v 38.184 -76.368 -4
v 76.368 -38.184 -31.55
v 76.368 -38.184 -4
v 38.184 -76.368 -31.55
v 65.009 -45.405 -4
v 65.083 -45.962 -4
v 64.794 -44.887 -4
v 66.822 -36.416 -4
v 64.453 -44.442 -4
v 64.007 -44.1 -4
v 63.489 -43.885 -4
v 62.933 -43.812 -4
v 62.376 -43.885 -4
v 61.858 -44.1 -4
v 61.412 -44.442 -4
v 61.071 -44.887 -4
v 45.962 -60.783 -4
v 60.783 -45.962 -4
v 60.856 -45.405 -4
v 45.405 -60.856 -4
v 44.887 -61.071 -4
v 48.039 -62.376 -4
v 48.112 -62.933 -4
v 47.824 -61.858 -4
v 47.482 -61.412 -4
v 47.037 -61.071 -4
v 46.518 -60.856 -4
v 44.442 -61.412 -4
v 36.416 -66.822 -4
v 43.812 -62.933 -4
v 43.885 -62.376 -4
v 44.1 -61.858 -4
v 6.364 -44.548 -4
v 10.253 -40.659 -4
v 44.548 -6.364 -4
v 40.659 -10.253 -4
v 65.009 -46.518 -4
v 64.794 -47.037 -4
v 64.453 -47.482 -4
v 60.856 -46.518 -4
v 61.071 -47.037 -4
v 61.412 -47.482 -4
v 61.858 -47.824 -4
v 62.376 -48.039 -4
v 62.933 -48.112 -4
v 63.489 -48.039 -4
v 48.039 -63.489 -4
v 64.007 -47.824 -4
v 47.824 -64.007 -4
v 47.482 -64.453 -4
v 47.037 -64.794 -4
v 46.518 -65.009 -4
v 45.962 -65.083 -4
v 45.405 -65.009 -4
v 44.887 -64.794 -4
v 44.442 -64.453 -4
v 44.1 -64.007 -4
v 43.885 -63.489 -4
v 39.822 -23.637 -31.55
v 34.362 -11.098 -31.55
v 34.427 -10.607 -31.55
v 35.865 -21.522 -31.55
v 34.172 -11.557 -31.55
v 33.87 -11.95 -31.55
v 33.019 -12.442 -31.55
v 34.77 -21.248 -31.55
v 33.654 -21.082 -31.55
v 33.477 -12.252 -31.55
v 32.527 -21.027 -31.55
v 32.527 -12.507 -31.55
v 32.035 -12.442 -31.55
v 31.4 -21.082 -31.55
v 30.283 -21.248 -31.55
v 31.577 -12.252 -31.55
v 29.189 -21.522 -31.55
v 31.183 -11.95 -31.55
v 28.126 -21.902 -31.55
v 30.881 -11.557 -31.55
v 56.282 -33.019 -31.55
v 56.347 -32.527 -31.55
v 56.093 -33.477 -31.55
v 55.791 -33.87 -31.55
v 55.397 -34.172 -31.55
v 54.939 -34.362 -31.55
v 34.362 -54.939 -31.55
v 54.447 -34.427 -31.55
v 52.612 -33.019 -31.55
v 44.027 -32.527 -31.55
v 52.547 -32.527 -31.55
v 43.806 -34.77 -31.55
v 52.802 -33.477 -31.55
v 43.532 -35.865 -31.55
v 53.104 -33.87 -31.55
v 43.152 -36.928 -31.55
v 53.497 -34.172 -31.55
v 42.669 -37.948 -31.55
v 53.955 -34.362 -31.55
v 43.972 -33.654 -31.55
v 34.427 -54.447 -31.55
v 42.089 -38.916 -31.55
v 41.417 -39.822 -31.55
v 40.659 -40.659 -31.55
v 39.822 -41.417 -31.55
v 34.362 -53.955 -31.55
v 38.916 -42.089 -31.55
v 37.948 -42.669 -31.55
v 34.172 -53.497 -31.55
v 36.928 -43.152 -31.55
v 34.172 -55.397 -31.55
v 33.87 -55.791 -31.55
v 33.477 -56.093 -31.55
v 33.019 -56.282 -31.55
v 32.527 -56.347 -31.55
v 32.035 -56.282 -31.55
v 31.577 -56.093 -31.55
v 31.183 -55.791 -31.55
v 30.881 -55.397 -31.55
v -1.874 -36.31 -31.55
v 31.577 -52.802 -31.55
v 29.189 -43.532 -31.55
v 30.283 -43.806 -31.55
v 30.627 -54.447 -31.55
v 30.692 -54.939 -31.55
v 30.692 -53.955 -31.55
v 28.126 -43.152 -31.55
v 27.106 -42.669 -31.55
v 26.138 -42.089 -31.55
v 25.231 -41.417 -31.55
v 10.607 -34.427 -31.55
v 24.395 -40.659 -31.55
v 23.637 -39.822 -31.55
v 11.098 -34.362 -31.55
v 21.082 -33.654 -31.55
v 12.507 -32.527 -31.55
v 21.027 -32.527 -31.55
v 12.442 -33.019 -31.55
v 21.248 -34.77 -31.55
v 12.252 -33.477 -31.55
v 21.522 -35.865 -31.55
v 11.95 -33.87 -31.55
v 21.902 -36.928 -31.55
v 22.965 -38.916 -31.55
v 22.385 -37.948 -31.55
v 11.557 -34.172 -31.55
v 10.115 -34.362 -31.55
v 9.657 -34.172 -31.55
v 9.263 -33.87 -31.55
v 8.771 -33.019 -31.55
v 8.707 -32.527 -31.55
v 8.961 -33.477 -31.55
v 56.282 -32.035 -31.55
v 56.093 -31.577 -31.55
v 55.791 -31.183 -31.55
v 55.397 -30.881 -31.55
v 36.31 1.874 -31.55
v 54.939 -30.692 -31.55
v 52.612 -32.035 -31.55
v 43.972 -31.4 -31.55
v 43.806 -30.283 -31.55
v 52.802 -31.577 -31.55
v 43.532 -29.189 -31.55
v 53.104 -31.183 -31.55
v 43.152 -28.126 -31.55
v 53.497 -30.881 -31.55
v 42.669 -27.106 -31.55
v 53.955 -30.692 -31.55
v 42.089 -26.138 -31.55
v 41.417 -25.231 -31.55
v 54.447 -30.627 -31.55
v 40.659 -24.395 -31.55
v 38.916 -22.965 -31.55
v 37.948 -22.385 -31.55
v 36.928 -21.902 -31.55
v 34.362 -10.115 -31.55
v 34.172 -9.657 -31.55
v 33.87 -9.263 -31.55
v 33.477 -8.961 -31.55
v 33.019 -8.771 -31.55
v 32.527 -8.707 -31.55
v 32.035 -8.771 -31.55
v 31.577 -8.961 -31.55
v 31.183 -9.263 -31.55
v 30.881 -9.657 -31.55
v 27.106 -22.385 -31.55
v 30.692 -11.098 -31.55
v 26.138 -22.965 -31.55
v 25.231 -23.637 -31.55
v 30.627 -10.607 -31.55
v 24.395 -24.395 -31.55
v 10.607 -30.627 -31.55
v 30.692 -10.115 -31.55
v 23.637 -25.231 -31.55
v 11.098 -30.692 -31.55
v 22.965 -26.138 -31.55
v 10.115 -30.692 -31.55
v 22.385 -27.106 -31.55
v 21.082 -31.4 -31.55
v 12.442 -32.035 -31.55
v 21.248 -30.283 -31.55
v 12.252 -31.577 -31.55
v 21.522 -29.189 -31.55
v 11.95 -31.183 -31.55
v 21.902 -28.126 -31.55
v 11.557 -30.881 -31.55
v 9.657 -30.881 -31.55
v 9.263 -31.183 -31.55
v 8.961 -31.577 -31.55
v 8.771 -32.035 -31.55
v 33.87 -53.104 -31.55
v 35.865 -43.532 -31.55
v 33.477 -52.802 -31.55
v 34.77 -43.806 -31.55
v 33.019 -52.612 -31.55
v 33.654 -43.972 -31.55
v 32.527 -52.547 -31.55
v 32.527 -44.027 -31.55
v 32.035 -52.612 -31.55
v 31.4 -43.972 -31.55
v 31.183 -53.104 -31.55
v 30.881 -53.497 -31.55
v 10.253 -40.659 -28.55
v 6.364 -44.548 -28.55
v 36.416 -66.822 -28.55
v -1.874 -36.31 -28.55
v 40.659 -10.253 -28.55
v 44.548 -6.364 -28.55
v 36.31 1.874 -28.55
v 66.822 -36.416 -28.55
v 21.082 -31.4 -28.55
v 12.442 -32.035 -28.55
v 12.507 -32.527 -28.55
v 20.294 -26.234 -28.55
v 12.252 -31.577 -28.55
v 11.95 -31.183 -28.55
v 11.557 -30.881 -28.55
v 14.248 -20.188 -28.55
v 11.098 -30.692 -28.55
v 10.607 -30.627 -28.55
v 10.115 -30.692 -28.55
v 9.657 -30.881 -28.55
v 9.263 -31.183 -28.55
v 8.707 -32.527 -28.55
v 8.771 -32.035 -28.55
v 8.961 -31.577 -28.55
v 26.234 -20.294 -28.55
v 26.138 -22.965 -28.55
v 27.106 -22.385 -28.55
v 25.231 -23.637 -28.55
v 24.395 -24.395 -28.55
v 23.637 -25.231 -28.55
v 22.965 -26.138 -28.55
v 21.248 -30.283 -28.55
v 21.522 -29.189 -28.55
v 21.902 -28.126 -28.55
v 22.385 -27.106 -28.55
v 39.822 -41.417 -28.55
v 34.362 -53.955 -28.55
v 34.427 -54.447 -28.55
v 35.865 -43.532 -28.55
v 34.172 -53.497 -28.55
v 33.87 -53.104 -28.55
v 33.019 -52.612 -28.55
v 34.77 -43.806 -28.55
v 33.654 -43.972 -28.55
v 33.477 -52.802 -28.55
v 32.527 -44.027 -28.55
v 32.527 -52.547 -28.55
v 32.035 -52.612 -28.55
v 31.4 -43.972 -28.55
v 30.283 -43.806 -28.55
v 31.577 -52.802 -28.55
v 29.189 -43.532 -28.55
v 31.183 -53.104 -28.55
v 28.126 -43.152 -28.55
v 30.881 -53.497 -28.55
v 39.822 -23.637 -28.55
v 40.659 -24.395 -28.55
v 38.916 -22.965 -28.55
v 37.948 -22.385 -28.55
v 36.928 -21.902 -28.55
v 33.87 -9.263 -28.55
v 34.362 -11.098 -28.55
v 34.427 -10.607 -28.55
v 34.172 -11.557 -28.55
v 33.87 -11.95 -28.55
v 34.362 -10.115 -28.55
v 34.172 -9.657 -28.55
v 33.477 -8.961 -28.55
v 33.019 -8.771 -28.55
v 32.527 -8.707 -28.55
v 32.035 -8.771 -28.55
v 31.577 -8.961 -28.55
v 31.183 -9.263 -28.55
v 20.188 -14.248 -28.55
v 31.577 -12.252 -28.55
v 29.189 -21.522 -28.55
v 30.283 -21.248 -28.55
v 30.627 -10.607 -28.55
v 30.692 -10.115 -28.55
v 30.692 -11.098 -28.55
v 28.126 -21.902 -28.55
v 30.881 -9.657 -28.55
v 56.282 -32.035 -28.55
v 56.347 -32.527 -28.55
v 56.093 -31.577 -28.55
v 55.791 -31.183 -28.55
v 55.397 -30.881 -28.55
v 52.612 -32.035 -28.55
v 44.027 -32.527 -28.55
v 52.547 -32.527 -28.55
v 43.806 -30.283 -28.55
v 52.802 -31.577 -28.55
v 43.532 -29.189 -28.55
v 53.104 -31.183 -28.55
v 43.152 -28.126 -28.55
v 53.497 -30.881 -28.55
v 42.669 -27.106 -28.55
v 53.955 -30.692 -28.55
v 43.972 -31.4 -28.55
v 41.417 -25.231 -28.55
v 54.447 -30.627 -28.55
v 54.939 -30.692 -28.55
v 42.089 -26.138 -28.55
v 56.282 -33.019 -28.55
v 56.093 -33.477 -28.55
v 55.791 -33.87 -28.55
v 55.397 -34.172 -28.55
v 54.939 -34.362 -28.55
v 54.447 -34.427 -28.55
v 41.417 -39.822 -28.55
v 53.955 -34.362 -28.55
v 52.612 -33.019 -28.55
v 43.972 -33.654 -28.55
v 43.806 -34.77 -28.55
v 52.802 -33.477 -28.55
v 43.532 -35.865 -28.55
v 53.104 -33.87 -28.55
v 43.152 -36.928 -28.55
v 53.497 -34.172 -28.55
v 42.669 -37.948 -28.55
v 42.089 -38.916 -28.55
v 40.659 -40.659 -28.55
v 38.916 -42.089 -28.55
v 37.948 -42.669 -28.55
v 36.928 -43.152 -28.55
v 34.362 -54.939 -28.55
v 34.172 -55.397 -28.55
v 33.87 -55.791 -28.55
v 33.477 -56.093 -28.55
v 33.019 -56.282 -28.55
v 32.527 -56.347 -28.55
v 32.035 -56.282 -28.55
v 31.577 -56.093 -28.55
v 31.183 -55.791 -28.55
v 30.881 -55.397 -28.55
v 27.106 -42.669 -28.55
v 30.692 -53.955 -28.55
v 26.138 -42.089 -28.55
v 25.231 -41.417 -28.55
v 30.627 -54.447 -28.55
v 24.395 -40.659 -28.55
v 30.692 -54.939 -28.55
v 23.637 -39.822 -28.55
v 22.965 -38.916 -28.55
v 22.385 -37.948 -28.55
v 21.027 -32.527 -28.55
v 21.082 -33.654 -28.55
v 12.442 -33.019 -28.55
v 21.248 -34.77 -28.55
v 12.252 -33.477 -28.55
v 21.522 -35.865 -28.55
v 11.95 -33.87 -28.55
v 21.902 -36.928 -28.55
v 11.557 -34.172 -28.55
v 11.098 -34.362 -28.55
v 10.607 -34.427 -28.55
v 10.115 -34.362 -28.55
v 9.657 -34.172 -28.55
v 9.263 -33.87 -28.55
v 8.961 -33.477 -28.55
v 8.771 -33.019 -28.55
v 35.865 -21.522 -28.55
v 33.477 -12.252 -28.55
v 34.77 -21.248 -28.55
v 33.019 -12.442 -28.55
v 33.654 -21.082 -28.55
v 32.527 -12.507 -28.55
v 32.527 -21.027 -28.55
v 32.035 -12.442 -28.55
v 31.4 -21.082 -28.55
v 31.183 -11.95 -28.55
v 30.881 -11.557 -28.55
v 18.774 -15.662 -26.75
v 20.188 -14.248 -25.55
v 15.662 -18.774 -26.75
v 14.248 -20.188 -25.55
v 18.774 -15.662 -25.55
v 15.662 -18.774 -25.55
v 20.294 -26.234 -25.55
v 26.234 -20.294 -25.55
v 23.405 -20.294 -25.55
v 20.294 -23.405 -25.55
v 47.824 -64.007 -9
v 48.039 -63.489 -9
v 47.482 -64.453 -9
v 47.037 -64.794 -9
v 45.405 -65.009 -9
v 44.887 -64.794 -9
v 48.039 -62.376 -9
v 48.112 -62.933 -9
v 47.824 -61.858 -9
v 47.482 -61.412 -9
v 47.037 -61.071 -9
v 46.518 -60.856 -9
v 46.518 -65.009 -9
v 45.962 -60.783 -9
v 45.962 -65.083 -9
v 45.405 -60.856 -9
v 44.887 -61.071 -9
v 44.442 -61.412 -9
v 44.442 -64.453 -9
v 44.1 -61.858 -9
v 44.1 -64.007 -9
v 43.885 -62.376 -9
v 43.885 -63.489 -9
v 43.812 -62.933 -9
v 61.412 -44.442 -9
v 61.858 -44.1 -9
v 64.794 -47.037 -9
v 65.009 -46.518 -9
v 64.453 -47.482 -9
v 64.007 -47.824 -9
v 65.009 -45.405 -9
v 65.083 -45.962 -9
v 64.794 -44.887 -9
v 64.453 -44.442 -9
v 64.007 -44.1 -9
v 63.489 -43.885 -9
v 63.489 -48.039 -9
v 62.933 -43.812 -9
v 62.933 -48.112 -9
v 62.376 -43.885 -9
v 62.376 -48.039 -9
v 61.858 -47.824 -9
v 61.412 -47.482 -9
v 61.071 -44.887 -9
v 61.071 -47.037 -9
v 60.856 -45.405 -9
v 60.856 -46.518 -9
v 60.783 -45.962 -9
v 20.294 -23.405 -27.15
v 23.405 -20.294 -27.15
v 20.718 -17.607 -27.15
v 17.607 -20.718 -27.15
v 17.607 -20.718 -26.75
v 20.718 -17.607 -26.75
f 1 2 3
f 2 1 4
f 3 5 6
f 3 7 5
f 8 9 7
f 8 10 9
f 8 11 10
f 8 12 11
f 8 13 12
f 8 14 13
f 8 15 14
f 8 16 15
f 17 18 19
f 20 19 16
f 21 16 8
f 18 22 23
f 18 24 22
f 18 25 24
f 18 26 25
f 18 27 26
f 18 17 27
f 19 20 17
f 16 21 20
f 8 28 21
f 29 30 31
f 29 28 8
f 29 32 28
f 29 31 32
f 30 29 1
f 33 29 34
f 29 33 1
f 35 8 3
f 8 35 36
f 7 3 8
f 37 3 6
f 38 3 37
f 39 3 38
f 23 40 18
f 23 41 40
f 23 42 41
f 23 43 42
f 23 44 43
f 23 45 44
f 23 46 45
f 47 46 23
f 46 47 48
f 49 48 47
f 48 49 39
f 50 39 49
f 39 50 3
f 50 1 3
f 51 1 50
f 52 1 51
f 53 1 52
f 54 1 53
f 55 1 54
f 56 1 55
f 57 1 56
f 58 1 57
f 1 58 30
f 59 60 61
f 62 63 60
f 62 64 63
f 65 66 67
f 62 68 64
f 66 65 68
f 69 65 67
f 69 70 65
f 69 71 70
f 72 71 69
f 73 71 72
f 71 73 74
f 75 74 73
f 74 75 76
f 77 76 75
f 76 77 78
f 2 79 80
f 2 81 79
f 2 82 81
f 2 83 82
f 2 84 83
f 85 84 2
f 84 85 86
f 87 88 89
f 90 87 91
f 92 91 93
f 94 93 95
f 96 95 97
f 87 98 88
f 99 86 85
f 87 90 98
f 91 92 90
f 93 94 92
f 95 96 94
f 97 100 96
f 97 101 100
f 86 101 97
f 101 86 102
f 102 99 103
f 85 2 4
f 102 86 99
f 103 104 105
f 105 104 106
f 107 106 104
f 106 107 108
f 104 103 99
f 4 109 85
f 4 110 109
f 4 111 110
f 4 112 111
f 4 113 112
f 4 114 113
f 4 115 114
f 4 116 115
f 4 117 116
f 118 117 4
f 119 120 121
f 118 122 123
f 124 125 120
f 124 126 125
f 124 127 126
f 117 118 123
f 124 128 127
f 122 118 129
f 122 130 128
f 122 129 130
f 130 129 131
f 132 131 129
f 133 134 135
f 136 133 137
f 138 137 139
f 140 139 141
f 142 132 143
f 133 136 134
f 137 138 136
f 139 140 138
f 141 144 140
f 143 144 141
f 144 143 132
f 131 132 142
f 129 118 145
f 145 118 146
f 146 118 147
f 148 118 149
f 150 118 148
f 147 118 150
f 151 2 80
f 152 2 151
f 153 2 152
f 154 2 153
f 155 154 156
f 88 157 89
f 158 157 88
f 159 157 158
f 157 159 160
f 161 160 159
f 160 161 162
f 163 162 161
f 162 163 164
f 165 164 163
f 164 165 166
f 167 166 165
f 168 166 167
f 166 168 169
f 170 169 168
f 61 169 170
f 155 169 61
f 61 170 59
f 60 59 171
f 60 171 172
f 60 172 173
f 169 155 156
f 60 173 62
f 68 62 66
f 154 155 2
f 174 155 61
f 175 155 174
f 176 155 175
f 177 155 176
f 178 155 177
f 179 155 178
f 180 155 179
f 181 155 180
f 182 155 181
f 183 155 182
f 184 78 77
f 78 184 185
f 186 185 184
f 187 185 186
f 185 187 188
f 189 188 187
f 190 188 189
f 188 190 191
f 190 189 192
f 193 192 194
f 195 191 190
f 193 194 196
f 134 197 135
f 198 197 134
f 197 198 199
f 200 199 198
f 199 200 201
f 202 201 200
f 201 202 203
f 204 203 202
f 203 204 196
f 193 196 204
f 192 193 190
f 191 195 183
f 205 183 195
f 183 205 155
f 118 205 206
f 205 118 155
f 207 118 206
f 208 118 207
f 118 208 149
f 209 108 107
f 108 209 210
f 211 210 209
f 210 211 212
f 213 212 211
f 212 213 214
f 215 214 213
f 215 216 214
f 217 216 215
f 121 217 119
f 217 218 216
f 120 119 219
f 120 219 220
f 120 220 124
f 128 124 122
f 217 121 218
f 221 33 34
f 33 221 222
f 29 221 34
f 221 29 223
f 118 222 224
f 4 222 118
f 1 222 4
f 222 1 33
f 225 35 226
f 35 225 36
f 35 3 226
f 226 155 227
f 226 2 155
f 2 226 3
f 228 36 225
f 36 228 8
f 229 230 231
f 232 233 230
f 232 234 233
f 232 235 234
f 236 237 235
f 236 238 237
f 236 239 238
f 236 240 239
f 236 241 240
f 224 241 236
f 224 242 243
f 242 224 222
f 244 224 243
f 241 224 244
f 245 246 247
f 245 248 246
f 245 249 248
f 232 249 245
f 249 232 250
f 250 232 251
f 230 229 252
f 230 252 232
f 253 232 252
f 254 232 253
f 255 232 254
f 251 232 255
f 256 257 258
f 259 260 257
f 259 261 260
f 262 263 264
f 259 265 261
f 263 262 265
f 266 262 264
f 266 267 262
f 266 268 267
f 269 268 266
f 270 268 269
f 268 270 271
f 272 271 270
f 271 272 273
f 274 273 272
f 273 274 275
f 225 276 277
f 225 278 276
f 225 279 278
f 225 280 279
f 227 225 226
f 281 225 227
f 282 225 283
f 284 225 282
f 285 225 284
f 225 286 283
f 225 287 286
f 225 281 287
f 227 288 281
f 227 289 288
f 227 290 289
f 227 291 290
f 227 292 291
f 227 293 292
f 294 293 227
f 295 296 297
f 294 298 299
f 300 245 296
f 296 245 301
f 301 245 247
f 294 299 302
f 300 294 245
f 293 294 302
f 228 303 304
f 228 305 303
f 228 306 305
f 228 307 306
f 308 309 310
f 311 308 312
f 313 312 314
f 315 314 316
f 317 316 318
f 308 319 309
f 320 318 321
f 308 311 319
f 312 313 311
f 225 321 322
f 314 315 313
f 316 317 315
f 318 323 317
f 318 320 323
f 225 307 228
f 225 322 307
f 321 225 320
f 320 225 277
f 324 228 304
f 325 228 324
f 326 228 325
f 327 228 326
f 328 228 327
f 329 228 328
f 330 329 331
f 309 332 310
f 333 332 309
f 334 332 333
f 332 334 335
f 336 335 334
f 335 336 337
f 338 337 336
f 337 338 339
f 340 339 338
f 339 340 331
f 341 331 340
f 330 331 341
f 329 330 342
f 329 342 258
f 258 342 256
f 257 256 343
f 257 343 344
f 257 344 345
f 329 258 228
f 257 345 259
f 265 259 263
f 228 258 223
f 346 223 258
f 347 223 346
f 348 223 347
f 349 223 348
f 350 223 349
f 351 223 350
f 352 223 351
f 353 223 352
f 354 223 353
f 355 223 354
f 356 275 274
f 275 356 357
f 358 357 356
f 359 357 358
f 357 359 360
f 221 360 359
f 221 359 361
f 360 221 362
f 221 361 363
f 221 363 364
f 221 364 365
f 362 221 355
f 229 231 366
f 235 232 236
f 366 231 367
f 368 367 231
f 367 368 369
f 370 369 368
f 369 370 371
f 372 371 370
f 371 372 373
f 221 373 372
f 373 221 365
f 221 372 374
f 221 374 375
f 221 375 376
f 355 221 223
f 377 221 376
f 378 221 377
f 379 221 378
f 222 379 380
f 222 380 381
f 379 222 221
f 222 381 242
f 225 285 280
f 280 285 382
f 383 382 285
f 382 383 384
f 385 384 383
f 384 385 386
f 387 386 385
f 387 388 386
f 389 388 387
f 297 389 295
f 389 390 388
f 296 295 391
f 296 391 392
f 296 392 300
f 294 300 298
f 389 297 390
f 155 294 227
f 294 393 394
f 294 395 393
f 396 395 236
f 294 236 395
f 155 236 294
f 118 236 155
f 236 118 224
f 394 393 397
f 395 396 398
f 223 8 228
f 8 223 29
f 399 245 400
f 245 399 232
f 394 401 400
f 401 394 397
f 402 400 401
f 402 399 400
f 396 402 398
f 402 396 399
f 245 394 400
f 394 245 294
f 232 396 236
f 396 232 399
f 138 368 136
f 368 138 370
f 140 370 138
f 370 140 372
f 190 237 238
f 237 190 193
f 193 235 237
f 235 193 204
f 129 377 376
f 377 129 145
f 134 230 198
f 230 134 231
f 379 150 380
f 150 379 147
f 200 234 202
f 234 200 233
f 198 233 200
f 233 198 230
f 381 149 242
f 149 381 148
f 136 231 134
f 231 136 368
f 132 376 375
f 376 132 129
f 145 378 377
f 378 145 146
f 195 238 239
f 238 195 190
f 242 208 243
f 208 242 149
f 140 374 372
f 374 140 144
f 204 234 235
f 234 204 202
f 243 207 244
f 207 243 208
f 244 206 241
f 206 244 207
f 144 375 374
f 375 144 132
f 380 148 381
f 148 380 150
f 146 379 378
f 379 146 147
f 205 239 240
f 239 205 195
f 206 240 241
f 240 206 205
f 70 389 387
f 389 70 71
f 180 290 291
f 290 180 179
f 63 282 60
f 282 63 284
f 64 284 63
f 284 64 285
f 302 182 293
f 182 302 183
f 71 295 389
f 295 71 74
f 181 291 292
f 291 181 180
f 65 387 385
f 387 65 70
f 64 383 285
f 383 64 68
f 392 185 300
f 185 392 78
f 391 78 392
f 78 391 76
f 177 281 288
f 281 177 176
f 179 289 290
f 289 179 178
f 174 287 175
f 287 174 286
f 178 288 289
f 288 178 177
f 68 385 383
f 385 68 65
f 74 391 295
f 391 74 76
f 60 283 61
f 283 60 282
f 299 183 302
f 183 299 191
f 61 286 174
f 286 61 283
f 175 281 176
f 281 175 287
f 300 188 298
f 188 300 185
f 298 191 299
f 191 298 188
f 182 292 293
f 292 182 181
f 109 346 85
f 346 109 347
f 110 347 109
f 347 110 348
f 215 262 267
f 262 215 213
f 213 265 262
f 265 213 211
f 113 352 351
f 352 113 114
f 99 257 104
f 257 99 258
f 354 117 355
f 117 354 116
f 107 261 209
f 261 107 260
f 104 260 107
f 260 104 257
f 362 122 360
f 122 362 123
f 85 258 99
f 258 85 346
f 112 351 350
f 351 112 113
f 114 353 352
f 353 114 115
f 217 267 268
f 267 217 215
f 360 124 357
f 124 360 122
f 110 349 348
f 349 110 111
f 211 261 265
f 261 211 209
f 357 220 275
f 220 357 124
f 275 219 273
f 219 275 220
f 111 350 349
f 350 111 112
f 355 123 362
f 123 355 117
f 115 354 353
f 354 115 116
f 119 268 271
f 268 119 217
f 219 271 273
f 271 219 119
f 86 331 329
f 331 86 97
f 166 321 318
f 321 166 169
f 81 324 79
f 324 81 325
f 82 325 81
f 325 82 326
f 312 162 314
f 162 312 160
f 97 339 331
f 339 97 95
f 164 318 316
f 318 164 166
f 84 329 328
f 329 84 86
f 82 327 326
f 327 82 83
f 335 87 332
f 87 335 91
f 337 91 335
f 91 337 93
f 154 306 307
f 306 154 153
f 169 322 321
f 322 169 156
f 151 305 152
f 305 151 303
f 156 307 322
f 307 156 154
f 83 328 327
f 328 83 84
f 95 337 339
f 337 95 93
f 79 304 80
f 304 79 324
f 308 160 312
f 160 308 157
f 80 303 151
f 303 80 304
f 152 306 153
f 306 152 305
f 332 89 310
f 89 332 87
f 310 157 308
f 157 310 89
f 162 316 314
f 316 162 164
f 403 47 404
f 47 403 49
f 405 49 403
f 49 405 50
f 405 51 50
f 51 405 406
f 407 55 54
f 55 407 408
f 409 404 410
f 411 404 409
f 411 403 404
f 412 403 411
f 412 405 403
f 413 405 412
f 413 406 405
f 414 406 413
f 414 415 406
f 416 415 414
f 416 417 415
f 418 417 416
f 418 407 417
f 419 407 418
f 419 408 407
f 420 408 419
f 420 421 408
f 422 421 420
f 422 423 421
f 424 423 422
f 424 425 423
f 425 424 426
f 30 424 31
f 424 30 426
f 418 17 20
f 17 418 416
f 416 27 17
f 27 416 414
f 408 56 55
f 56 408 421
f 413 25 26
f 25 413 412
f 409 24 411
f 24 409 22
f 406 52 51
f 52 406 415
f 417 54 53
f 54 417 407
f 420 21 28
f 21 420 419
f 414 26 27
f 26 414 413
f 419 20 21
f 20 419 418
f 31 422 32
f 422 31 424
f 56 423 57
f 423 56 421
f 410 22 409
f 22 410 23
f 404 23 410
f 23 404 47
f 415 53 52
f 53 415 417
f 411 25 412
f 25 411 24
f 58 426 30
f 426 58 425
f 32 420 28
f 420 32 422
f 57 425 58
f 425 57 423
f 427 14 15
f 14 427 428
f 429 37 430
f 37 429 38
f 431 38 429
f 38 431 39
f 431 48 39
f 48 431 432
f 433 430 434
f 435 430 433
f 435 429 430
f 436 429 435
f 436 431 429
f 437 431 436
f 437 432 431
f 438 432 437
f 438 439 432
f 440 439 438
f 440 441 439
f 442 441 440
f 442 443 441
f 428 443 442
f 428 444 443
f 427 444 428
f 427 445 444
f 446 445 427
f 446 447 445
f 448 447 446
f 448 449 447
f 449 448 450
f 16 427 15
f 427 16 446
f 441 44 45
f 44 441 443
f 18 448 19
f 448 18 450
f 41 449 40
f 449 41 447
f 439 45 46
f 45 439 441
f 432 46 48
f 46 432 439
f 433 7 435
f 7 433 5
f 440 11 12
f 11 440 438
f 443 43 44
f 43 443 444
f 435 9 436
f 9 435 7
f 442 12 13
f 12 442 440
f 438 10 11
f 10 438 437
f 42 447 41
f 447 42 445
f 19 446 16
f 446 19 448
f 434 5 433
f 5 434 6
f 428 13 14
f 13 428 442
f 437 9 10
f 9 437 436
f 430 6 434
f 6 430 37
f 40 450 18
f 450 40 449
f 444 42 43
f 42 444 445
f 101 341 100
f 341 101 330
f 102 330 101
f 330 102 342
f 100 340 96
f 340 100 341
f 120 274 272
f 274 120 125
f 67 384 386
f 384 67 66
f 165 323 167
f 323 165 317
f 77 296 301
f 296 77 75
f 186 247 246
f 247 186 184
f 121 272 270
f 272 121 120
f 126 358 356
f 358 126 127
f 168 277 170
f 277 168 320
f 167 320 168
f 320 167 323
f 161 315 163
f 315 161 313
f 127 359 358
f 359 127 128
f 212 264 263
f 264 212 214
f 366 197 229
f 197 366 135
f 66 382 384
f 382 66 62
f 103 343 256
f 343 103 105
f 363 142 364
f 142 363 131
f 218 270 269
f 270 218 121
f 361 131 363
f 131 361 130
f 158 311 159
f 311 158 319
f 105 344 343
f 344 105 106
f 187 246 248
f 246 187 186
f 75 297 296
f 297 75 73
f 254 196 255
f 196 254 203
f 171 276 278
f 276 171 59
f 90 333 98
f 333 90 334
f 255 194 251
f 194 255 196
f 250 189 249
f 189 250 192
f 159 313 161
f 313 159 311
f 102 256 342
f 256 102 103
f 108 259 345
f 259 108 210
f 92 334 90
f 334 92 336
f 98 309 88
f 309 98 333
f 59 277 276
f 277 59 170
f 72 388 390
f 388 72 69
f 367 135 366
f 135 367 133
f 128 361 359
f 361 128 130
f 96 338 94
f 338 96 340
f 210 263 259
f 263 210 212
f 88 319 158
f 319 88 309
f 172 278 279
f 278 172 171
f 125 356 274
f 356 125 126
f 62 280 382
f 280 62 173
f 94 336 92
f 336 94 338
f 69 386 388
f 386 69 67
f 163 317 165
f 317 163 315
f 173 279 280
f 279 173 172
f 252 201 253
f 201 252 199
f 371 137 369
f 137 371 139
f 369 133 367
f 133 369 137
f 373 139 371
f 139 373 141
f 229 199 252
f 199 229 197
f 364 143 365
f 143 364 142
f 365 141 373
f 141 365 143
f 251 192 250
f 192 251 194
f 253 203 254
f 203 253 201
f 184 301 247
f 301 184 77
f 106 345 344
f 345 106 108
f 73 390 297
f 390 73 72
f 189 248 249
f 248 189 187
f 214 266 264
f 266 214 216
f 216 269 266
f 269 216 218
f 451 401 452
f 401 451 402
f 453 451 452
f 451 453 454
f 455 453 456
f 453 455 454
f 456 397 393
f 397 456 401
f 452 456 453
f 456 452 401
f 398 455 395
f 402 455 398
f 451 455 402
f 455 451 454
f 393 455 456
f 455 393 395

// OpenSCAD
// file: ../../level2.scad
// Level 2 - shared dimensions for the drive deck, motor bracket, body and skirt.
// Frame: origin at the centre of the deck's TOP surface; +Z up, +Y = front (display), +X = right.
// The lazy Susan sits on the deck's plinth; the turntable pulley hangs through the deck's hole.
include <params.scad>

// ---- outline -------------------------------------------------------------------------------
l2_size   = [160, 160];     // footprint (rounded square), same for body and skirt
l2_r      = 14;             // corner radius
l2_h      = 90;             // body height (floor to the deck's underside... see body)
l2_wall   = 2.5;            // body walls

// ---- the reComputer under Level 2, and the skirt round it (skirt.scad) -------------------------
jetson    = [130.1, 121.1, 51];     // reComputer J4012, MEASURED (x, y, height) with its case top OFF;
                                    //   ports at the back, fan near the middle (~1 cm toward the front)
jetson_top = 7.1;                   // the case top, if fitted: 58.1 with it, MEASURED
air_gap   = 10;                     // over the case top when it's on (17 over the open board): the fan
                                    //   draws in from here
skirt_h   = jetson[2] + jetson_top + air_gap;   // 68.1: desk -> Level 2's floor
// body <-> skirt screws (M3 down through the body floor into inserts in the skirt): along the
// sides, outside the reComputer (x +/-65)
skirt_pts = [[-71, -45], [-71, 45], [71, -45], [71, 5]];   // clear of the buck (left),
                                    //   the perfboard (right front) and the motor (right back)

// ---- deck ----------------------------------------------------------------------------------
deck_t    = 4;              // deck plate: z = -deck_t .. 0
deck_hole = 112;            // reach the inner ring's bolts from below during assembly

// ---- lazy Susan + turntable pulley (turntable_pulley.scad) --------------------------------
z_ls      = plinth_h;                    // lazy Susan's underside (on the plinth): 2
z_plate   = z_ls + ls_h;                 // turntable plate's underside = inner ring top: 12.5
belt_drop = 24.5;                        // plate underside -> belt centre (turntable_pulley)
z_belt    = z_plate - belt_drop;         // -12: belt centre, below the deck top
pulley_R  = 100 * 2 / PI / 2;            // 31.83: ring pulley pitch radius (100 T)
pulley_bottom = z_belt - 3.2 - 1.6 - 2.2;  // -19: lowest point of the hanging pulley
clamp_r   = 35.5;                        // pulley's belt clamp block (its widest part)

// ---- motor ----------------------------------------------------------------------------------
motor_a   = -45;            // direction of the motor from the centre: back-right corner
motor_C   = 46;             // nominal centre distance; the bracket slides +/- tension_travel (42..50:
                            //   at 41 the motor pulley would touch the ring pulley's flange)
tension_travel = 4;
nema      = [42.3, 33.4];   // NEMA17 (MEASURED body length; not a pancake): square, body length
nema_shaft = 17.5;          // MEASURED shaft length above the face
nema_holes = 31;            // M3 screw spacing on its face
nema_boss = 22;             // centring boss on its face (dia), ~2 tall
mp_T      = 20;             // motor pulley teeth
mp_belt_c = 13 + 7.1 / 2;   // MEASURED: pulley pushed fully down on the motor, its toothed section
                            //   (7.1 wide; the belt is a standard 6 mm) runs 13..20.1 above the face
bracket_t = 3;              // motor plate thickness; the pulley passes down through its centre hole
bracket_drop = 3;           // the motor hangs this much LOWER than "pulley pushed fully down" needs:
                            //   on the first build the ring pulley sat ~2 mm below the motor pulley,
                            //   so the motor pulley now starts ~1 mm low and is raised on the shaft
                            //   to line the belt up (a few mm of adjustment either way)
z_motor_face  = z_belt - mp_belt_c - bracket_drop;   // -31.55
z_bracket_top = z_motor_face + bracket_t;    // -28.55
z_motor_bottom = z_motor_face - nema[1];     // -64.95
z_mp_top  = z_motor_face + bracket_drop + 13 + 7.1 + 1;   // ~-7.45 (pulley raised to the belt; EST top flange ~1 mm)
// main file
// Motor bracket - hangs the NEMA17 (shaft up) under the drive deck so its 20 T pulley
// lines up with the turntable pulley's teeth. Two M3 screws from above the deck, through its
// radial slots, into heat-set inserts in the bracket's far wall: slide it outward to tension the
// belt. The motor screws to the plate from above (4 x M3) before the bracket goes in; its pulley
// then goes on, pushed fully down through the plate's centre hole onto the motor.
//
// Also carries the HOMING SENSOR: an A3144-type Hall sensor lying face-up in a pocket on the
// plate, under the turntable pulley's bottom edge. A small magnet glued under the pulley (on the
// flat ring of its bottom face, ~28 mm from the centre, on the motor side when the head looks
// straight ahead) passes ~4 mm above it at home. The sensor sits on a pad bracket_drop (3 mm) tall,
// so lowering the motor for belt adjustment didn't move it away from the magnet. Its leads run straight inward along a short
// groove to the plate's inner edge and drop down beside the motor - clear of the motor's screws
// (a groove out to the side would cross a screw hole, and the screw head would pinch the wires).
//
// Modelled in place (deck frame, see level2.scad) with the plate at the bottom.
// PRINT as modelled: plate on the bed, walls up, no supports. PETG.
include <../../level2.scad>

m3_clear  = 3.4 + cal_hole;               // prints ~3.35 (PETG): M3 slides through
plate_u   = [-nema[0] / 2 - 0.5, 35];     // plate extent along the radial line (motor frame)
half_v    = 27;                           // half-width across it
side_wall = 5.5;                          // side walls, |v| = half_v - side_wall .. half_v
side_u0   = -10;                          // side walls start here: clear of the pulley's clamp
                                          //   block even with the bracket slid 4 mm inward
far_wall  = [27, 35];                     // far wall (u range): takes the two deck screws
slot_u    = 31; slot_v = 12;              // must match drive_deck.scad
hall      = [3.4 + 0.4, 4.0 + 0.4, 1.6];  // A3144 TO-92 lying flat: [u, v, depth]
hall_u    = -17;                          // ~28 mm from the turntable's centre
hall_pad  = [hall[0] + 4, hall[1] + 4];   // raised pad under the sensor (u, v), from the plate's inner edge

module bracket() {
    z0 = z_motor_face;                    // plate underside = motor face
    z1 = -deck_t;                         // wall tops = deck underside
    difference() {
        union() {
            // motor plate
            translate([plate_u[0], -half_v, z0]) cube([plate_u[1] - plate_u[0], 2 * half_v, bracket_t]);
            // side walls
            for (s = [-1, 1]) translate([side_u0, s > 0 ? half_v - side_wall : -half_v, z0])
                cube([plate_u[1] - side_u0, side_wall, z1 - z0]);
            // far wall
            translate([far_wall[0], -half_v, z0]) cube([far_wall[1] - far_wall[0], 2 * half_v, z1 - z0]);
            // pad under the Hall sensor: keeps it at its original height under the magnet
            translate([plate_u[0], -hall_pad[1] / 2, z0]) cube([hall_u + hall_pad[0] / 2 - plate_u[0], hall_pad[1], bracket_t + bracket_drop]);
        }
        // motor centring boss and its four screws
        translate([0, 0, z0 - 1]) cylinder(d = nema_boss + 1, h = bracket_t + 2, $fn = 64);
        for (su = [-1, 1], sv = [-1, 1]) translate([su * nema_holes / 2, sv * nema_holes / 2, z0 - 1])
            cylinder(d = m3_clear, h = bracket_t + 2, $fn = 24);
        // heat-set inserts for the deck screws
        for (v = [-slot_v, slot_v]) translate([slot_u, v, z1 - insert_m3[1]]) cylinder(d = insert_m3[0], h = insert_m3[1] + 1, $fn = 24);
        // Hall sensor pocket (leads toward the inner edge) + lead groove out over that edge
        translate([hall_u - hall[0] / 2, -hall[1] / 2, z0 + bracket_t + bracket_drop - hall[2]]) cube([hall[0], hall[1], hall[2] + 1]);
        translate([plate_u[0] - 1, -hall[1] / 2, z0 + bracket_t + bracket_drop - 1.2]) cube([hall_u - plate_u[0] + 1, hall[1], 2]);
    }
}

rotate(motor_a) translate([motor_C, 0, 0]) bracket();

// ghosts (not printed): motor and its pulley
%rotate(motor_a) translate([motor_C, 0, 0]) {
    translate([-nema[0] / 2, -nema[0] / 2, z_motor_bottom]) cube([nema[0], nema[0], nema[1]]);
    translate([0, 0, z_motor_face]) cylinder(d = 16, h = z_mp_top - z_motor_face);
}
